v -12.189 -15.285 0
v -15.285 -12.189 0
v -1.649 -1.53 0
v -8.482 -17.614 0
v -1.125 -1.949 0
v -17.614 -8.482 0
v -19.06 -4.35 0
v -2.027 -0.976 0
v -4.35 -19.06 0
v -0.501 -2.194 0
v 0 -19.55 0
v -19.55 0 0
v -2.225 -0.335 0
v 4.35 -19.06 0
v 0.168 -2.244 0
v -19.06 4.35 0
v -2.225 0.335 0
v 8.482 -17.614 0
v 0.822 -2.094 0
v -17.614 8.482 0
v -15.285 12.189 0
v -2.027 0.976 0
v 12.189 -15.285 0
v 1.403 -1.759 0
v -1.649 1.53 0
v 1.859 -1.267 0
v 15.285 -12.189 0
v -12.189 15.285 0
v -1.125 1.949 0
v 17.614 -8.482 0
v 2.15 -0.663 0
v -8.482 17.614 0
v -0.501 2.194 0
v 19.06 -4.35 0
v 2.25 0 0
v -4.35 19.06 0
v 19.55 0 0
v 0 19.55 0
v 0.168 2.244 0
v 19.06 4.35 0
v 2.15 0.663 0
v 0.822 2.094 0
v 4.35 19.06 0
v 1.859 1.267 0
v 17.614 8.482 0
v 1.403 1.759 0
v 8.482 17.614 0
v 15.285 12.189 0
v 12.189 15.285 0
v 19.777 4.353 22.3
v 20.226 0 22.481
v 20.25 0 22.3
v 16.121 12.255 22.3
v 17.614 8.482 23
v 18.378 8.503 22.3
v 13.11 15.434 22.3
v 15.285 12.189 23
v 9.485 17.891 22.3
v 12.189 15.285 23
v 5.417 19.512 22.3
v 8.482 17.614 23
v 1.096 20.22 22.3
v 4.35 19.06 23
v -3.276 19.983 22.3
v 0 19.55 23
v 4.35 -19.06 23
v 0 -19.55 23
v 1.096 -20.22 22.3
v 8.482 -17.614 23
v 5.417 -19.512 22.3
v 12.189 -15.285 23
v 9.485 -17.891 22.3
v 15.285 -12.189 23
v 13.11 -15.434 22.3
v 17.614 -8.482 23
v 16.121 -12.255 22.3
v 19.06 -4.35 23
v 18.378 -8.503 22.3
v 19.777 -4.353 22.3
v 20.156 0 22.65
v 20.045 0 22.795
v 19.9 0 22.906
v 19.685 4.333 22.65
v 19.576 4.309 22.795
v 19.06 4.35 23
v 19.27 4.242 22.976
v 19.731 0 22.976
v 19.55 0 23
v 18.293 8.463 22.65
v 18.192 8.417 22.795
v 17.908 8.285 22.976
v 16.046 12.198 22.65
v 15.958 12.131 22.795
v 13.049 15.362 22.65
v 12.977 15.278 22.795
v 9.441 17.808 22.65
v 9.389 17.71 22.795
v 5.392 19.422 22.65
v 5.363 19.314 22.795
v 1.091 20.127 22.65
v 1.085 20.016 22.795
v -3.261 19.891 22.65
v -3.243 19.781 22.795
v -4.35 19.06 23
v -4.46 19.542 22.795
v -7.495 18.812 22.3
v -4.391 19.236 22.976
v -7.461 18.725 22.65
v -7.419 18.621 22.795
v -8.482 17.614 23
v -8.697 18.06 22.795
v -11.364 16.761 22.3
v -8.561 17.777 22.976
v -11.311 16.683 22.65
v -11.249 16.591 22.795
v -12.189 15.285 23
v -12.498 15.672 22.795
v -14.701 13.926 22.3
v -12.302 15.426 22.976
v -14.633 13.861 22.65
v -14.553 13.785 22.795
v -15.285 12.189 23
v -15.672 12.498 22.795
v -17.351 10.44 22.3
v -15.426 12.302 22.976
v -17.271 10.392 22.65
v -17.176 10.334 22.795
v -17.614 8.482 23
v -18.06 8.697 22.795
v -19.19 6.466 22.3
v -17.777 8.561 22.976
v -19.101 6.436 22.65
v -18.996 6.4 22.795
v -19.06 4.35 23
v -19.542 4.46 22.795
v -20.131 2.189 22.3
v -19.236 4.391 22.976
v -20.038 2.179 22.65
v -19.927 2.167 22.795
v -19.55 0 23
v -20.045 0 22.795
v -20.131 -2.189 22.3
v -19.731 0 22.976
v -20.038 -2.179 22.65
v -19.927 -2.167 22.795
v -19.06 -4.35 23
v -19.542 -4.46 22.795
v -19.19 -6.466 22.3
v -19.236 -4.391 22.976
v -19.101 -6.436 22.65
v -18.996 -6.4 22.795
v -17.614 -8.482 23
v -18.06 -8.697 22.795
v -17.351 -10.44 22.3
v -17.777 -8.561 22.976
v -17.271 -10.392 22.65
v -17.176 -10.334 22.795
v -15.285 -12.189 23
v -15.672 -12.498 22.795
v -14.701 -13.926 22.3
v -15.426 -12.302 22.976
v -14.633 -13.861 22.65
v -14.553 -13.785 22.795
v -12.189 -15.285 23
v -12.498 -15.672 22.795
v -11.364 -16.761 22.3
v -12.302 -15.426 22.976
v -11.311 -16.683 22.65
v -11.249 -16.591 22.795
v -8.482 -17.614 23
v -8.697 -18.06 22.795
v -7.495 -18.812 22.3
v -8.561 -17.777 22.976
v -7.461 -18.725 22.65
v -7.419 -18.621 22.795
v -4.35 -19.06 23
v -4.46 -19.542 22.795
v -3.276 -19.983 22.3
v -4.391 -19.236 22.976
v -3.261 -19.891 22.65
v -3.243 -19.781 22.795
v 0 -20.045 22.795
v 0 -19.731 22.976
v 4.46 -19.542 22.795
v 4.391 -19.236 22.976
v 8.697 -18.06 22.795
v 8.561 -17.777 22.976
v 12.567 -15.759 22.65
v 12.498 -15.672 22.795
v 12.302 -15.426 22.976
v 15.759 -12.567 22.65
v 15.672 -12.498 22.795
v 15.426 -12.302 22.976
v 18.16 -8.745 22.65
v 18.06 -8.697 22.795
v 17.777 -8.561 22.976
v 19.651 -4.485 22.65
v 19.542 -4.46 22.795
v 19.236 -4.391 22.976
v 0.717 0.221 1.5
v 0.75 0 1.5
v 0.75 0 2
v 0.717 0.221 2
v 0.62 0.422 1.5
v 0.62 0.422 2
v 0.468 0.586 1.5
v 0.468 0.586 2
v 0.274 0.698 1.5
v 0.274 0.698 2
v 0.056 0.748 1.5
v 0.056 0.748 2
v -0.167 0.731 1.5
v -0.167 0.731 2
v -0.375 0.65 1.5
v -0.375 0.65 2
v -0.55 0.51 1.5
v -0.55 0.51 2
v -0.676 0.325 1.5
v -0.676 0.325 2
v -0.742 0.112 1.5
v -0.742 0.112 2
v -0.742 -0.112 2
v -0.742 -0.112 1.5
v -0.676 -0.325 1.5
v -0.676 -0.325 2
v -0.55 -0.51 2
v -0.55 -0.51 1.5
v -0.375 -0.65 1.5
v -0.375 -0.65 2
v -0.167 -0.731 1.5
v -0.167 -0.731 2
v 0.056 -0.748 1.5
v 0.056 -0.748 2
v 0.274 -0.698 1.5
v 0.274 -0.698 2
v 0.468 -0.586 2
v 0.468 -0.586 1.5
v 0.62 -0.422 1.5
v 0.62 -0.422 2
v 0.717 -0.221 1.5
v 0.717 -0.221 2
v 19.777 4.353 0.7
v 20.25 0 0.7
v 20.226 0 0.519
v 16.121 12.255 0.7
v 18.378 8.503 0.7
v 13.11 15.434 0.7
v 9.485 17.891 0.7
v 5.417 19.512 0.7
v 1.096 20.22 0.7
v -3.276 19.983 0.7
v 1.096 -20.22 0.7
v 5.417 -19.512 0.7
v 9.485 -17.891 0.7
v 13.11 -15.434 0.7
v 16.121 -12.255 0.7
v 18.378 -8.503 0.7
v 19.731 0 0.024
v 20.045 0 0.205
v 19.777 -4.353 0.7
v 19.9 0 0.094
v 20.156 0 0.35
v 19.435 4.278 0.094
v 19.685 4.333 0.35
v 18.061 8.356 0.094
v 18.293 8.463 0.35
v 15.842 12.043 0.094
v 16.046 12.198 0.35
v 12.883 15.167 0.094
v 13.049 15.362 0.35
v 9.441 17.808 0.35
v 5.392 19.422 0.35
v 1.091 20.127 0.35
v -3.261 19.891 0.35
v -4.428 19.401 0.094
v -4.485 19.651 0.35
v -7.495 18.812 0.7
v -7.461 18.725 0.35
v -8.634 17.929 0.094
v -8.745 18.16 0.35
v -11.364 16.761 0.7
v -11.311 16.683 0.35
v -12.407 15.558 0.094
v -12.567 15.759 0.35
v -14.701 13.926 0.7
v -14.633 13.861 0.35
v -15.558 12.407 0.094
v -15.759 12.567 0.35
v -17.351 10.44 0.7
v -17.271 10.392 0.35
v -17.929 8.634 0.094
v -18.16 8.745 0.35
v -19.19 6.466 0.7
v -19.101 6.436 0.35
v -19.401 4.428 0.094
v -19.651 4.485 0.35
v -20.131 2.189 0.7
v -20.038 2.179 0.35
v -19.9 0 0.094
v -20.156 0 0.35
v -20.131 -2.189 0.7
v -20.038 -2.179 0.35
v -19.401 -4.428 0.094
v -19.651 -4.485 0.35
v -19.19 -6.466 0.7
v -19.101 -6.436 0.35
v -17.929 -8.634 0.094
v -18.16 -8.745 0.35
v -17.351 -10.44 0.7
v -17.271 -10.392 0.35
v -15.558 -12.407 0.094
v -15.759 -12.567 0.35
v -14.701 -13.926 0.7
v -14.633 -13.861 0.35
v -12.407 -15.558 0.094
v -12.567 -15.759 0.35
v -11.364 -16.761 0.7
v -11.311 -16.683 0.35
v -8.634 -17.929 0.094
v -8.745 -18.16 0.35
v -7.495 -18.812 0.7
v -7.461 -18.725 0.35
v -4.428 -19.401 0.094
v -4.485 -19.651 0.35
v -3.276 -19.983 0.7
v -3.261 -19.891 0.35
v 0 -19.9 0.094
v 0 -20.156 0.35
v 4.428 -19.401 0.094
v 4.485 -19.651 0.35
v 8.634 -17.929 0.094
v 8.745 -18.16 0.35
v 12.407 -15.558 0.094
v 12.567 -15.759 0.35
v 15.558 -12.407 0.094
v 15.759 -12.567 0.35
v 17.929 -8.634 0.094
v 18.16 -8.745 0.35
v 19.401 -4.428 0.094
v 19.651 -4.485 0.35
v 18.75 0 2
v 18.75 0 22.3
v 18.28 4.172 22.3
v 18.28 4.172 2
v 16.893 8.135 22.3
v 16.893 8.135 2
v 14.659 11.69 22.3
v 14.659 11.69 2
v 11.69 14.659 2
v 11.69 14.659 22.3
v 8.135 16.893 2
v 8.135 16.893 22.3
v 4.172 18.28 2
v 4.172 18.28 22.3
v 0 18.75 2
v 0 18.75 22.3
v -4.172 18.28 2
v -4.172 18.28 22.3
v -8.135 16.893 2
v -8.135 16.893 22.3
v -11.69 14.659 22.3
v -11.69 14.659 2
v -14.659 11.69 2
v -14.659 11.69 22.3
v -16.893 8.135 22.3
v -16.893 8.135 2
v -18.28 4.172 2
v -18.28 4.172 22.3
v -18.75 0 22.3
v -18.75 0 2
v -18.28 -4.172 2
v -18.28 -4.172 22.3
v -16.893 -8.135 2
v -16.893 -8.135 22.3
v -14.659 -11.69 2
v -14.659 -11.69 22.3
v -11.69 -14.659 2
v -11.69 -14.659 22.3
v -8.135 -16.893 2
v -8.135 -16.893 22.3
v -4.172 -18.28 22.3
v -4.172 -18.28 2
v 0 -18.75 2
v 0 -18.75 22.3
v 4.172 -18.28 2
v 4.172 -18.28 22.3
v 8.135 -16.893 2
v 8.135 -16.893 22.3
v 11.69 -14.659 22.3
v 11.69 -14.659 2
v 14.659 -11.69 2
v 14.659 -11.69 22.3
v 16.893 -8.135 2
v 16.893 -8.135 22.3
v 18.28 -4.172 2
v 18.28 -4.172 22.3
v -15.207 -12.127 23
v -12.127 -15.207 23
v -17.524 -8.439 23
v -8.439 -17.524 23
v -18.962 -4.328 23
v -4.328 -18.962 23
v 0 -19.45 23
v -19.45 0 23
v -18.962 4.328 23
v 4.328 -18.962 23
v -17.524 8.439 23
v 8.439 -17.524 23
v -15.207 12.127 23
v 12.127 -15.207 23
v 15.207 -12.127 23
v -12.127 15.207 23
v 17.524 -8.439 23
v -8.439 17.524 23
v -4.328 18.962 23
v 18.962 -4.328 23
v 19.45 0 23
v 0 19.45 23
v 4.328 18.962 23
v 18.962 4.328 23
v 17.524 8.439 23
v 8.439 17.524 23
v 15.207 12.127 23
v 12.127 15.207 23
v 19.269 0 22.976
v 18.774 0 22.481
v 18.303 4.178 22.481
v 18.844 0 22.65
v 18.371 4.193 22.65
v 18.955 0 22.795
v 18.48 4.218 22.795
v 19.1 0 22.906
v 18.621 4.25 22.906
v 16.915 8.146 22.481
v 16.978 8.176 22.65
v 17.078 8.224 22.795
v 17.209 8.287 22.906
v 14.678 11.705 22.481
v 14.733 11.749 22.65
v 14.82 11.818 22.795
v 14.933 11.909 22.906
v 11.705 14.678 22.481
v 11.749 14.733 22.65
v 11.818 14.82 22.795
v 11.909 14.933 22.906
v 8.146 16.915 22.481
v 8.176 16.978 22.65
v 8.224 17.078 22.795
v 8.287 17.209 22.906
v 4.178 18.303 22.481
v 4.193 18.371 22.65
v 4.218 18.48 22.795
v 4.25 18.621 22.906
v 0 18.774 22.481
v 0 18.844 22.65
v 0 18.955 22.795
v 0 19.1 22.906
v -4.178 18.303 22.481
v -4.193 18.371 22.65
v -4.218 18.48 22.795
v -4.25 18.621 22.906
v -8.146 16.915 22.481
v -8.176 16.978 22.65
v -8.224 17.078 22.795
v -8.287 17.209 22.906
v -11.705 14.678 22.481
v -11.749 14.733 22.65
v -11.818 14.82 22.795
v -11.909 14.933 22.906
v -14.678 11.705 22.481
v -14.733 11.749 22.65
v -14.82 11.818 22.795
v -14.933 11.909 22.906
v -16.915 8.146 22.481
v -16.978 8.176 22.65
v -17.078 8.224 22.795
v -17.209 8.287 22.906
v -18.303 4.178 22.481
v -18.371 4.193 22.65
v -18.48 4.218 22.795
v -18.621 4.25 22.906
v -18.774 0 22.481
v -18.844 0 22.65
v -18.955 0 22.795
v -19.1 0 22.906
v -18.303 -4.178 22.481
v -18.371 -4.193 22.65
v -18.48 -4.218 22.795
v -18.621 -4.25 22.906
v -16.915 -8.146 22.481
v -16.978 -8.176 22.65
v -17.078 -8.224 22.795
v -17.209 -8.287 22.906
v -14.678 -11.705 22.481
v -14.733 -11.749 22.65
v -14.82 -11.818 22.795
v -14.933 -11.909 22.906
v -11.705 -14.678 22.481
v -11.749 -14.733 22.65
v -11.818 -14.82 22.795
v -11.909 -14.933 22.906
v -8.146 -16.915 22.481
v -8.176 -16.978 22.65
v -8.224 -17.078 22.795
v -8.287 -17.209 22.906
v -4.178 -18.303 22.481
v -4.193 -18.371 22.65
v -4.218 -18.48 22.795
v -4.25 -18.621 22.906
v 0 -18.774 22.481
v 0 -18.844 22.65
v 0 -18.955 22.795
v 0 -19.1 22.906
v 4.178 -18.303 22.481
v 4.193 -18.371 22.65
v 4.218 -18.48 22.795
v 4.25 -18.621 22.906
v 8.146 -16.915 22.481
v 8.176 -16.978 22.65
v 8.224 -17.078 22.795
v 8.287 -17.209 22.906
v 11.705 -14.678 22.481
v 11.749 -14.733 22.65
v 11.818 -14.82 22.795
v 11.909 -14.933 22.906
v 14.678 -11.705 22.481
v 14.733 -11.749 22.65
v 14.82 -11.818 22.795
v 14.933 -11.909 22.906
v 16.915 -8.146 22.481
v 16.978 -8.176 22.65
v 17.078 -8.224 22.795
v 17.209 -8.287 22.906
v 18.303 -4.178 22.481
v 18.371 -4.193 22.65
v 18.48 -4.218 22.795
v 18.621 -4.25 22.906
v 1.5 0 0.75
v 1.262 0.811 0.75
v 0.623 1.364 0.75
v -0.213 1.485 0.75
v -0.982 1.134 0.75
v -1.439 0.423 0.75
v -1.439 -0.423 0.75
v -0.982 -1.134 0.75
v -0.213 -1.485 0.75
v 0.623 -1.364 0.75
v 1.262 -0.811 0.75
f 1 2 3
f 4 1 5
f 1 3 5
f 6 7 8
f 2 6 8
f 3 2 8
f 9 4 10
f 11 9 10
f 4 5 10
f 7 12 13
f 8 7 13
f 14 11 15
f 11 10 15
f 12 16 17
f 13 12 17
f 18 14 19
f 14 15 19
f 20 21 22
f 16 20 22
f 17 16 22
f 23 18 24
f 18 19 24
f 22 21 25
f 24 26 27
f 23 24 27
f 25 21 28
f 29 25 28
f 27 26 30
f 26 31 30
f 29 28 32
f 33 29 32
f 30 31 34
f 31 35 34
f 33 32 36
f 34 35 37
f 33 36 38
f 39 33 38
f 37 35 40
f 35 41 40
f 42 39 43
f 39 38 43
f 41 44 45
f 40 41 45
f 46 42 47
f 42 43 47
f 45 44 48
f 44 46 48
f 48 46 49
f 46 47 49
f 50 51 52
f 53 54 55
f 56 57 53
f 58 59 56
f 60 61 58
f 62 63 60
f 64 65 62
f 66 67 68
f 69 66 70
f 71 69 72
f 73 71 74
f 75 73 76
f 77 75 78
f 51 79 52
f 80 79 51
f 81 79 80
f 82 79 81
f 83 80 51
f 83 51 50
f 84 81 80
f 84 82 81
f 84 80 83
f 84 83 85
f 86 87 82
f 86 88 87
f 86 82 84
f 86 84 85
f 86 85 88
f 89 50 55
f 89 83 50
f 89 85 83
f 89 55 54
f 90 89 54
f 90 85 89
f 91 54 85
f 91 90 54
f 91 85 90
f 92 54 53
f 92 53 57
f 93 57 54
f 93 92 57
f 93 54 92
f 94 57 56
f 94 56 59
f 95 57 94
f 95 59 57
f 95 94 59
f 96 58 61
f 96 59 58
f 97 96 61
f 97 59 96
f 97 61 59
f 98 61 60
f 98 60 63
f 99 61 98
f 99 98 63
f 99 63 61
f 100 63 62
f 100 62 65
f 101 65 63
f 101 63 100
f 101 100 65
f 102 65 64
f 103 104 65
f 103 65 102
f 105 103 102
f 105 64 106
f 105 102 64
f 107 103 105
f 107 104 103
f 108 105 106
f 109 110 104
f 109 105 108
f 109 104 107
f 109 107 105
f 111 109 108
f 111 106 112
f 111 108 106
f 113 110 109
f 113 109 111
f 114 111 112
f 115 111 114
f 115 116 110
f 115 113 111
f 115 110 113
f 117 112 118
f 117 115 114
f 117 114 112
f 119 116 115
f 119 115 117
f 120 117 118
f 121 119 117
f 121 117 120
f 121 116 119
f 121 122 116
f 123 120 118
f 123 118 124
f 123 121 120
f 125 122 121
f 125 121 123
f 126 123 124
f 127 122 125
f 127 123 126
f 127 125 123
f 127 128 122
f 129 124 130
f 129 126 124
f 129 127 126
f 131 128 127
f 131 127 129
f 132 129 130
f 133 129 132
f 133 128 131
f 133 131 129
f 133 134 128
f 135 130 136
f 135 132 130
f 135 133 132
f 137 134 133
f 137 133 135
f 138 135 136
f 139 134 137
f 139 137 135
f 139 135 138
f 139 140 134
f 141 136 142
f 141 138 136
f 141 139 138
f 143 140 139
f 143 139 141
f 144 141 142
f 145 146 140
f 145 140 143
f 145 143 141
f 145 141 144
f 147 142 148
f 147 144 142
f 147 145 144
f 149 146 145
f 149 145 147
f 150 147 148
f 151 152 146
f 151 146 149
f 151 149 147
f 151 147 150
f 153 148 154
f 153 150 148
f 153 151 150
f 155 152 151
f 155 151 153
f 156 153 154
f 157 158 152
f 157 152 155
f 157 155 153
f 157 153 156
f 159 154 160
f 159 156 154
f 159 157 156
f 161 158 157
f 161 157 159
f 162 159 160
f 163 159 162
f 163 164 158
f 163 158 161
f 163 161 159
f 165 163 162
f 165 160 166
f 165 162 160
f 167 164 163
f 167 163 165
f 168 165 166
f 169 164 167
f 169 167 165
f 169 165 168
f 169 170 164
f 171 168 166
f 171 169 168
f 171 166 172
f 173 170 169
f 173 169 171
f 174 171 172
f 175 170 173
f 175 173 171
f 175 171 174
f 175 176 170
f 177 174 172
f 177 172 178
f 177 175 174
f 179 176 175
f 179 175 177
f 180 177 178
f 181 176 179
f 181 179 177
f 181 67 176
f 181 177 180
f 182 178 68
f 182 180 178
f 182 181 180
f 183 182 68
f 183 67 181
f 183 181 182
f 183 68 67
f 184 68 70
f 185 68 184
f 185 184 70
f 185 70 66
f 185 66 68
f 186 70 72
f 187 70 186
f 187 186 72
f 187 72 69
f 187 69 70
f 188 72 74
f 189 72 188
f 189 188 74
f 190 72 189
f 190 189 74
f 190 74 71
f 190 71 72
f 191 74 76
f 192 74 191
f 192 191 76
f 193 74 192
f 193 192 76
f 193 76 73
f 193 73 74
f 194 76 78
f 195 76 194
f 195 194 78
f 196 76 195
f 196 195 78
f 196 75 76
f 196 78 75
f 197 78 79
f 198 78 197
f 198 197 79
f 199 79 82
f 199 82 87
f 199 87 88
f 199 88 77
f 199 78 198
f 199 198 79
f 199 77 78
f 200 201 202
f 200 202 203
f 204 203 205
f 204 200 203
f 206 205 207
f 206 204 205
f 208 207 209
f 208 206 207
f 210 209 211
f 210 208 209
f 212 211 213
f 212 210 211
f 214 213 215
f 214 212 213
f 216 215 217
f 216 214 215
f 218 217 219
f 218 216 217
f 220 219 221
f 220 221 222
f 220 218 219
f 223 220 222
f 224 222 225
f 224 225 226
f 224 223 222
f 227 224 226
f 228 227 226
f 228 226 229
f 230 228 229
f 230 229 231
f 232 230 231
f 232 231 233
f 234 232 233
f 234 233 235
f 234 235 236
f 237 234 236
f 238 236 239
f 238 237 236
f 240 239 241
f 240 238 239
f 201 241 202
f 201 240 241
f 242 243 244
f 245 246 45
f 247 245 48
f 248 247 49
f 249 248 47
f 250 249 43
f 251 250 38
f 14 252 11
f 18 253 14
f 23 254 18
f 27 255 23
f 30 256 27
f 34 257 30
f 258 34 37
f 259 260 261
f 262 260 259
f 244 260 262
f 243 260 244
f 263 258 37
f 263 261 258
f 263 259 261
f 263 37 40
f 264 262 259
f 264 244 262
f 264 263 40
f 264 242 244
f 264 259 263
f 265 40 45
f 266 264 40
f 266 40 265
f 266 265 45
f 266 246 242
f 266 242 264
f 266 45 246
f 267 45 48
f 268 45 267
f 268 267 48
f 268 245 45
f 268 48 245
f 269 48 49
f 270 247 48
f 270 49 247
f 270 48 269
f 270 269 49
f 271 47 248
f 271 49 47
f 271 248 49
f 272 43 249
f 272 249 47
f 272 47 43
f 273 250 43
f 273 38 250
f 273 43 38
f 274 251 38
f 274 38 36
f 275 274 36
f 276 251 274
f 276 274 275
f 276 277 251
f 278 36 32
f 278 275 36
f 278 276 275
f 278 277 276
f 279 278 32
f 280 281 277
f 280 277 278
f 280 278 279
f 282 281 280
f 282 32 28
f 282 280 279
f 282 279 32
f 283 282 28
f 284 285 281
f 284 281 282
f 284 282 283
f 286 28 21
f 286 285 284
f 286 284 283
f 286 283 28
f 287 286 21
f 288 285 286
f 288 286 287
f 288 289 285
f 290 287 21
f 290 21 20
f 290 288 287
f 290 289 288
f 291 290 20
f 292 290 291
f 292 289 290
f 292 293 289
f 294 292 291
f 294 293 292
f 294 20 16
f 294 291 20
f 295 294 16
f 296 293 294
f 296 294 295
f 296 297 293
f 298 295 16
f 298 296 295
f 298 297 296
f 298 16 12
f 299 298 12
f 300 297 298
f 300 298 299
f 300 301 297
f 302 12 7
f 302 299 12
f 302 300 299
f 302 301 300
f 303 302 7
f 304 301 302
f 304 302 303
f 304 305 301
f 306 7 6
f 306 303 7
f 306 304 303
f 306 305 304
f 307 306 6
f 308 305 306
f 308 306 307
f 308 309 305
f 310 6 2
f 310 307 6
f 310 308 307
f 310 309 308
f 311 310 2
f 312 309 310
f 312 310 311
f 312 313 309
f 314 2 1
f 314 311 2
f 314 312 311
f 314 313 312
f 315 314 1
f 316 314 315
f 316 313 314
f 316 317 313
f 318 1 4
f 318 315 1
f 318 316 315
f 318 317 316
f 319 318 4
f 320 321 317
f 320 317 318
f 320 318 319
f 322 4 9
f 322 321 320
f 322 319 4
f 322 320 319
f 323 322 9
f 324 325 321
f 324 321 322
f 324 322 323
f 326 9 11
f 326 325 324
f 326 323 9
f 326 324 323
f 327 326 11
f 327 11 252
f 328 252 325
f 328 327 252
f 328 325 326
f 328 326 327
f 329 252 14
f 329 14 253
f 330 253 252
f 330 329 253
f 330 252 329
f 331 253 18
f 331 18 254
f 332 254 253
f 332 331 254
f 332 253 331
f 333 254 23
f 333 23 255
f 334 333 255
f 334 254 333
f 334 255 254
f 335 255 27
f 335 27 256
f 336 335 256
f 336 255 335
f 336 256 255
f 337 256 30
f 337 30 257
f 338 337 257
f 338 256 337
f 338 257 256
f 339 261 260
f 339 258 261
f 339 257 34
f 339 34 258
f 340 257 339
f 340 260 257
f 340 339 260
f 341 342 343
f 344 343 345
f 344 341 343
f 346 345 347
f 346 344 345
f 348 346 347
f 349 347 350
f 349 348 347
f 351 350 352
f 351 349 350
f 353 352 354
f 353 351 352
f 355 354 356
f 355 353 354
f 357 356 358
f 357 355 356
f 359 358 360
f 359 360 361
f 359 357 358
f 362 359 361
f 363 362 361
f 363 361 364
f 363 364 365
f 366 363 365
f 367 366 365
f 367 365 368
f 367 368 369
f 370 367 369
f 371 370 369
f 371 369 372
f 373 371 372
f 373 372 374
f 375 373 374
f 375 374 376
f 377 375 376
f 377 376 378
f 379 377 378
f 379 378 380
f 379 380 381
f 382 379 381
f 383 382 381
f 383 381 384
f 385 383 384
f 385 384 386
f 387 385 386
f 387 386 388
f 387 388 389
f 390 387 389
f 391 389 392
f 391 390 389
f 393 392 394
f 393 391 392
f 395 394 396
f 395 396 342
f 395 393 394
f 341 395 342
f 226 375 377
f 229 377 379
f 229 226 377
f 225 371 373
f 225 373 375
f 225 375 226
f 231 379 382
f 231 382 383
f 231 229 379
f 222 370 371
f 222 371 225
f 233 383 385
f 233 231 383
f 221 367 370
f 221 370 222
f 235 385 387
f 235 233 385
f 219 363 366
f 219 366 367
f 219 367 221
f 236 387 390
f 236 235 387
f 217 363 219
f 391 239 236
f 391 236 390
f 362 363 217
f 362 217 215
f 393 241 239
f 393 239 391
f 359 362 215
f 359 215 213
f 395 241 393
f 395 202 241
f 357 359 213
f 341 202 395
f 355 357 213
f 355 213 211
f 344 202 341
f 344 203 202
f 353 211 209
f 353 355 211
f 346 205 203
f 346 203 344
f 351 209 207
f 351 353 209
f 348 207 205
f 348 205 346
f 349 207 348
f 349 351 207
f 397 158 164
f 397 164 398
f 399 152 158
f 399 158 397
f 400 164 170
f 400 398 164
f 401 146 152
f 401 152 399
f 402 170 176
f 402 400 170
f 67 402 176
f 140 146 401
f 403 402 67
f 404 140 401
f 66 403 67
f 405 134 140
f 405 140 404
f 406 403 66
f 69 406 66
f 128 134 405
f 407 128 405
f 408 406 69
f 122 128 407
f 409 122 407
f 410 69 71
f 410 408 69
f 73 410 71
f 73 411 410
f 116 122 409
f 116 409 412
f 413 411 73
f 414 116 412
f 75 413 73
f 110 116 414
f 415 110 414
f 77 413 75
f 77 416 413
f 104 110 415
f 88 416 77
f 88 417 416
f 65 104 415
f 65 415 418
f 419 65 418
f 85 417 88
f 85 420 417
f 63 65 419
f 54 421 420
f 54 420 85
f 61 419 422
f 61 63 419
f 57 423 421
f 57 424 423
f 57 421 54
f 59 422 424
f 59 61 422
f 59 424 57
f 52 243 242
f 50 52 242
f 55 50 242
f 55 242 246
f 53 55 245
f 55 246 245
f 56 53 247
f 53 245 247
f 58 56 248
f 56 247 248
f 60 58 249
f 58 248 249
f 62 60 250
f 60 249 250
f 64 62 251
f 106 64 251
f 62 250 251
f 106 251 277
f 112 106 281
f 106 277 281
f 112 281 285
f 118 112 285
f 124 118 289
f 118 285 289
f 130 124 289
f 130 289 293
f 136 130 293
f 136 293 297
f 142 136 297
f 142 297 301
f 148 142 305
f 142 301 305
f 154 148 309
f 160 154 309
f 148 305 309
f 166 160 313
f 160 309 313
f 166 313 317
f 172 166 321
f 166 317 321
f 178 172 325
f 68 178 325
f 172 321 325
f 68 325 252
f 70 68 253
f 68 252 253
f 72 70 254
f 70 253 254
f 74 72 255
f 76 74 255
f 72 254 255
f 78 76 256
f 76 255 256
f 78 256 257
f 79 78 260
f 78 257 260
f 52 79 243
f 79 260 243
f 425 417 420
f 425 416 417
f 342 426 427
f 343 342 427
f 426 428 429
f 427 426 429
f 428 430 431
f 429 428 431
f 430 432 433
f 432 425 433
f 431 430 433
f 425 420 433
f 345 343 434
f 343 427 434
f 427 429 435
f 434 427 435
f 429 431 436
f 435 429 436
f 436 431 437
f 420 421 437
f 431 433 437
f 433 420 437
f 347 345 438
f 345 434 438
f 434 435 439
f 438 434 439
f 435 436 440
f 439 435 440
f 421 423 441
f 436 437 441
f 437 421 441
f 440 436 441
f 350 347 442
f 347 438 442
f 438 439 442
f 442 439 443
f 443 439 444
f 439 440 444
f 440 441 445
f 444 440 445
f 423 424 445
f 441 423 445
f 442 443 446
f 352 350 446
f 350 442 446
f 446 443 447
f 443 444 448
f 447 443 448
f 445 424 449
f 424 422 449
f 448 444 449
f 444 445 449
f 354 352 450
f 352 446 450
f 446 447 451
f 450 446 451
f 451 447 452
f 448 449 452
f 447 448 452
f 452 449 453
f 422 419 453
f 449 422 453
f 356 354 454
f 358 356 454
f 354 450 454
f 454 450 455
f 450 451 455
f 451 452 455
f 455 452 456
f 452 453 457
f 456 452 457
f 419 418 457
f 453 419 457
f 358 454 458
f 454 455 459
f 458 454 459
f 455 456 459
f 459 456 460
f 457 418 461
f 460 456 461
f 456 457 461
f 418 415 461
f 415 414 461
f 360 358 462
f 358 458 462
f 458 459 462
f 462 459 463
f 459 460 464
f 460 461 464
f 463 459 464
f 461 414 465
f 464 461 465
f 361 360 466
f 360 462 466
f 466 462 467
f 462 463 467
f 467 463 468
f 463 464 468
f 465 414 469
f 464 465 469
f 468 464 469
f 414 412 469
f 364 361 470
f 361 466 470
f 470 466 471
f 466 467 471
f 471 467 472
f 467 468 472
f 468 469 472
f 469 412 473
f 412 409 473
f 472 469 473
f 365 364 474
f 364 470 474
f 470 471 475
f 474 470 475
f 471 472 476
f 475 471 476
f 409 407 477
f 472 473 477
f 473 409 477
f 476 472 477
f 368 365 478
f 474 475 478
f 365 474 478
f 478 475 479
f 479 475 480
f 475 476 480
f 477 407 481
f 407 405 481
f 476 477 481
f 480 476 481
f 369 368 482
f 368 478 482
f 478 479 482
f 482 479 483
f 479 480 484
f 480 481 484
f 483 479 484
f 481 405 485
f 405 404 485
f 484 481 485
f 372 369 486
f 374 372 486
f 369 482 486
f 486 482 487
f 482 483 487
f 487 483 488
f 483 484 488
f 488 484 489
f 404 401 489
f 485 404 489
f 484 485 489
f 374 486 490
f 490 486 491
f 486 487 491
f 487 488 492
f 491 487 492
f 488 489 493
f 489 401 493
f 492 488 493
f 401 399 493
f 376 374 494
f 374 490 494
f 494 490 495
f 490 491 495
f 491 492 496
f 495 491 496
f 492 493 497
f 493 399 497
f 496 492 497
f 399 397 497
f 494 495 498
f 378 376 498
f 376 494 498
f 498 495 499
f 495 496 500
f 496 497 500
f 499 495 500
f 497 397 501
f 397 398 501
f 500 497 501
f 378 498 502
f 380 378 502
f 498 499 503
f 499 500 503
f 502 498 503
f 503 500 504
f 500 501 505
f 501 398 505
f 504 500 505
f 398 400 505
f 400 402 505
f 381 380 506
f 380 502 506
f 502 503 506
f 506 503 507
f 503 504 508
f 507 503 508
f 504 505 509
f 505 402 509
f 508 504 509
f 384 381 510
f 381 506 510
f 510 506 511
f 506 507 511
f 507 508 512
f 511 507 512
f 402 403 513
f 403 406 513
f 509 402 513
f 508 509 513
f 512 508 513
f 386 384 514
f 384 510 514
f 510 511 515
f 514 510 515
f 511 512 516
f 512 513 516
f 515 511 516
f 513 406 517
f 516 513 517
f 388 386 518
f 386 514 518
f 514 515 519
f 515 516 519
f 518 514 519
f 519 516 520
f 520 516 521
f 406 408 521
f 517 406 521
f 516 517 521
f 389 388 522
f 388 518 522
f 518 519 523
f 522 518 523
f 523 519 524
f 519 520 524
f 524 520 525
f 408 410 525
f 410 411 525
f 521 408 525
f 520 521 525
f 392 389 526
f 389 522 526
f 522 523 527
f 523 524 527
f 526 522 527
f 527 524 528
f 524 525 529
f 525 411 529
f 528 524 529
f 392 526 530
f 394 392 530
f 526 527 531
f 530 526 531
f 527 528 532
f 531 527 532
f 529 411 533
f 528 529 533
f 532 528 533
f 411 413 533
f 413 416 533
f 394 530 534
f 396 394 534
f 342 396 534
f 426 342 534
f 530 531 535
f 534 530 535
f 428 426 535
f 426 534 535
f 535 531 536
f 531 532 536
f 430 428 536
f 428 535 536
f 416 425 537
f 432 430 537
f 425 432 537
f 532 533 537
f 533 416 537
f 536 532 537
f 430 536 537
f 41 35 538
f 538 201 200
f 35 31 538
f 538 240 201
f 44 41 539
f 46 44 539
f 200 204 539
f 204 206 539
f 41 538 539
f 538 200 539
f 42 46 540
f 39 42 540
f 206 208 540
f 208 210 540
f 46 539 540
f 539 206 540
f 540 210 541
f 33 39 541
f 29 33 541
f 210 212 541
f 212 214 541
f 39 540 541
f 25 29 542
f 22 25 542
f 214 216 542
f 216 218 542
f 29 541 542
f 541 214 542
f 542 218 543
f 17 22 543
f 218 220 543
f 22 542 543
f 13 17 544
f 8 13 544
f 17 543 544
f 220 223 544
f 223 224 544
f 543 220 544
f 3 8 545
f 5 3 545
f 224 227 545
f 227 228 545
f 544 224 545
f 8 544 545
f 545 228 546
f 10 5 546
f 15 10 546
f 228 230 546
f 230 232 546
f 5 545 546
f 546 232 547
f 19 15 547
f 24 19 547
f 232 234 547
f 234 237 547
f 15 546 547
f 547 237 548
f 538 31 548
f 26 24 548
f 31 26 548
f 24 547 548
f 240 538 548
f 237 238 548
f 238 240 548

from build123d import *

# Parameters (mm, degrees)
F0_R     = 20.25
F0_R_2   = 18.75
F1_DEPTH = 23
F0_R_3   = 0.75
F2_DEPTH = 2
F3_R     = 0.7
F4_SIZE2 = 1.5
F4_SIZE  = 1.5


with BuildPart() as f1:
    # F0 (on Top) → F1 (new body)
    with BuildSketch(Plane.XY):
        Circle(F0_R)
        Circle(F0_R_2, mode=Mode.SUBTRACT)
    extrude(amount=F1_DEPTH)

    # F0 (on Top) → F2 (join)
    with BuildSketch(Plane.XY):
        Circle(F0_R_2)
        Circle(F0_R_3, mode=Mode.SUBTRACT)
    extrude(amount=F2_DEPTH)

    # F3
    f3_edges = [f1.edges().sort_by_distance(p)[0] for p in [
        (-20.25, 0, 23),
        (-18.75, 0, 23),
        (-20.25, 0, 0),
    ]]
    fillet(f3_edges, radius=F3_R)

    # F4
    f4_edges = [f1.edges().sort_by_distance(p)[0] for p in [
        (-0.75, 0, 0),
    ]]
    chamfer(f4_edges, length=F4_SIZE, length2=F4_SIZE2)


solid = f1.part
